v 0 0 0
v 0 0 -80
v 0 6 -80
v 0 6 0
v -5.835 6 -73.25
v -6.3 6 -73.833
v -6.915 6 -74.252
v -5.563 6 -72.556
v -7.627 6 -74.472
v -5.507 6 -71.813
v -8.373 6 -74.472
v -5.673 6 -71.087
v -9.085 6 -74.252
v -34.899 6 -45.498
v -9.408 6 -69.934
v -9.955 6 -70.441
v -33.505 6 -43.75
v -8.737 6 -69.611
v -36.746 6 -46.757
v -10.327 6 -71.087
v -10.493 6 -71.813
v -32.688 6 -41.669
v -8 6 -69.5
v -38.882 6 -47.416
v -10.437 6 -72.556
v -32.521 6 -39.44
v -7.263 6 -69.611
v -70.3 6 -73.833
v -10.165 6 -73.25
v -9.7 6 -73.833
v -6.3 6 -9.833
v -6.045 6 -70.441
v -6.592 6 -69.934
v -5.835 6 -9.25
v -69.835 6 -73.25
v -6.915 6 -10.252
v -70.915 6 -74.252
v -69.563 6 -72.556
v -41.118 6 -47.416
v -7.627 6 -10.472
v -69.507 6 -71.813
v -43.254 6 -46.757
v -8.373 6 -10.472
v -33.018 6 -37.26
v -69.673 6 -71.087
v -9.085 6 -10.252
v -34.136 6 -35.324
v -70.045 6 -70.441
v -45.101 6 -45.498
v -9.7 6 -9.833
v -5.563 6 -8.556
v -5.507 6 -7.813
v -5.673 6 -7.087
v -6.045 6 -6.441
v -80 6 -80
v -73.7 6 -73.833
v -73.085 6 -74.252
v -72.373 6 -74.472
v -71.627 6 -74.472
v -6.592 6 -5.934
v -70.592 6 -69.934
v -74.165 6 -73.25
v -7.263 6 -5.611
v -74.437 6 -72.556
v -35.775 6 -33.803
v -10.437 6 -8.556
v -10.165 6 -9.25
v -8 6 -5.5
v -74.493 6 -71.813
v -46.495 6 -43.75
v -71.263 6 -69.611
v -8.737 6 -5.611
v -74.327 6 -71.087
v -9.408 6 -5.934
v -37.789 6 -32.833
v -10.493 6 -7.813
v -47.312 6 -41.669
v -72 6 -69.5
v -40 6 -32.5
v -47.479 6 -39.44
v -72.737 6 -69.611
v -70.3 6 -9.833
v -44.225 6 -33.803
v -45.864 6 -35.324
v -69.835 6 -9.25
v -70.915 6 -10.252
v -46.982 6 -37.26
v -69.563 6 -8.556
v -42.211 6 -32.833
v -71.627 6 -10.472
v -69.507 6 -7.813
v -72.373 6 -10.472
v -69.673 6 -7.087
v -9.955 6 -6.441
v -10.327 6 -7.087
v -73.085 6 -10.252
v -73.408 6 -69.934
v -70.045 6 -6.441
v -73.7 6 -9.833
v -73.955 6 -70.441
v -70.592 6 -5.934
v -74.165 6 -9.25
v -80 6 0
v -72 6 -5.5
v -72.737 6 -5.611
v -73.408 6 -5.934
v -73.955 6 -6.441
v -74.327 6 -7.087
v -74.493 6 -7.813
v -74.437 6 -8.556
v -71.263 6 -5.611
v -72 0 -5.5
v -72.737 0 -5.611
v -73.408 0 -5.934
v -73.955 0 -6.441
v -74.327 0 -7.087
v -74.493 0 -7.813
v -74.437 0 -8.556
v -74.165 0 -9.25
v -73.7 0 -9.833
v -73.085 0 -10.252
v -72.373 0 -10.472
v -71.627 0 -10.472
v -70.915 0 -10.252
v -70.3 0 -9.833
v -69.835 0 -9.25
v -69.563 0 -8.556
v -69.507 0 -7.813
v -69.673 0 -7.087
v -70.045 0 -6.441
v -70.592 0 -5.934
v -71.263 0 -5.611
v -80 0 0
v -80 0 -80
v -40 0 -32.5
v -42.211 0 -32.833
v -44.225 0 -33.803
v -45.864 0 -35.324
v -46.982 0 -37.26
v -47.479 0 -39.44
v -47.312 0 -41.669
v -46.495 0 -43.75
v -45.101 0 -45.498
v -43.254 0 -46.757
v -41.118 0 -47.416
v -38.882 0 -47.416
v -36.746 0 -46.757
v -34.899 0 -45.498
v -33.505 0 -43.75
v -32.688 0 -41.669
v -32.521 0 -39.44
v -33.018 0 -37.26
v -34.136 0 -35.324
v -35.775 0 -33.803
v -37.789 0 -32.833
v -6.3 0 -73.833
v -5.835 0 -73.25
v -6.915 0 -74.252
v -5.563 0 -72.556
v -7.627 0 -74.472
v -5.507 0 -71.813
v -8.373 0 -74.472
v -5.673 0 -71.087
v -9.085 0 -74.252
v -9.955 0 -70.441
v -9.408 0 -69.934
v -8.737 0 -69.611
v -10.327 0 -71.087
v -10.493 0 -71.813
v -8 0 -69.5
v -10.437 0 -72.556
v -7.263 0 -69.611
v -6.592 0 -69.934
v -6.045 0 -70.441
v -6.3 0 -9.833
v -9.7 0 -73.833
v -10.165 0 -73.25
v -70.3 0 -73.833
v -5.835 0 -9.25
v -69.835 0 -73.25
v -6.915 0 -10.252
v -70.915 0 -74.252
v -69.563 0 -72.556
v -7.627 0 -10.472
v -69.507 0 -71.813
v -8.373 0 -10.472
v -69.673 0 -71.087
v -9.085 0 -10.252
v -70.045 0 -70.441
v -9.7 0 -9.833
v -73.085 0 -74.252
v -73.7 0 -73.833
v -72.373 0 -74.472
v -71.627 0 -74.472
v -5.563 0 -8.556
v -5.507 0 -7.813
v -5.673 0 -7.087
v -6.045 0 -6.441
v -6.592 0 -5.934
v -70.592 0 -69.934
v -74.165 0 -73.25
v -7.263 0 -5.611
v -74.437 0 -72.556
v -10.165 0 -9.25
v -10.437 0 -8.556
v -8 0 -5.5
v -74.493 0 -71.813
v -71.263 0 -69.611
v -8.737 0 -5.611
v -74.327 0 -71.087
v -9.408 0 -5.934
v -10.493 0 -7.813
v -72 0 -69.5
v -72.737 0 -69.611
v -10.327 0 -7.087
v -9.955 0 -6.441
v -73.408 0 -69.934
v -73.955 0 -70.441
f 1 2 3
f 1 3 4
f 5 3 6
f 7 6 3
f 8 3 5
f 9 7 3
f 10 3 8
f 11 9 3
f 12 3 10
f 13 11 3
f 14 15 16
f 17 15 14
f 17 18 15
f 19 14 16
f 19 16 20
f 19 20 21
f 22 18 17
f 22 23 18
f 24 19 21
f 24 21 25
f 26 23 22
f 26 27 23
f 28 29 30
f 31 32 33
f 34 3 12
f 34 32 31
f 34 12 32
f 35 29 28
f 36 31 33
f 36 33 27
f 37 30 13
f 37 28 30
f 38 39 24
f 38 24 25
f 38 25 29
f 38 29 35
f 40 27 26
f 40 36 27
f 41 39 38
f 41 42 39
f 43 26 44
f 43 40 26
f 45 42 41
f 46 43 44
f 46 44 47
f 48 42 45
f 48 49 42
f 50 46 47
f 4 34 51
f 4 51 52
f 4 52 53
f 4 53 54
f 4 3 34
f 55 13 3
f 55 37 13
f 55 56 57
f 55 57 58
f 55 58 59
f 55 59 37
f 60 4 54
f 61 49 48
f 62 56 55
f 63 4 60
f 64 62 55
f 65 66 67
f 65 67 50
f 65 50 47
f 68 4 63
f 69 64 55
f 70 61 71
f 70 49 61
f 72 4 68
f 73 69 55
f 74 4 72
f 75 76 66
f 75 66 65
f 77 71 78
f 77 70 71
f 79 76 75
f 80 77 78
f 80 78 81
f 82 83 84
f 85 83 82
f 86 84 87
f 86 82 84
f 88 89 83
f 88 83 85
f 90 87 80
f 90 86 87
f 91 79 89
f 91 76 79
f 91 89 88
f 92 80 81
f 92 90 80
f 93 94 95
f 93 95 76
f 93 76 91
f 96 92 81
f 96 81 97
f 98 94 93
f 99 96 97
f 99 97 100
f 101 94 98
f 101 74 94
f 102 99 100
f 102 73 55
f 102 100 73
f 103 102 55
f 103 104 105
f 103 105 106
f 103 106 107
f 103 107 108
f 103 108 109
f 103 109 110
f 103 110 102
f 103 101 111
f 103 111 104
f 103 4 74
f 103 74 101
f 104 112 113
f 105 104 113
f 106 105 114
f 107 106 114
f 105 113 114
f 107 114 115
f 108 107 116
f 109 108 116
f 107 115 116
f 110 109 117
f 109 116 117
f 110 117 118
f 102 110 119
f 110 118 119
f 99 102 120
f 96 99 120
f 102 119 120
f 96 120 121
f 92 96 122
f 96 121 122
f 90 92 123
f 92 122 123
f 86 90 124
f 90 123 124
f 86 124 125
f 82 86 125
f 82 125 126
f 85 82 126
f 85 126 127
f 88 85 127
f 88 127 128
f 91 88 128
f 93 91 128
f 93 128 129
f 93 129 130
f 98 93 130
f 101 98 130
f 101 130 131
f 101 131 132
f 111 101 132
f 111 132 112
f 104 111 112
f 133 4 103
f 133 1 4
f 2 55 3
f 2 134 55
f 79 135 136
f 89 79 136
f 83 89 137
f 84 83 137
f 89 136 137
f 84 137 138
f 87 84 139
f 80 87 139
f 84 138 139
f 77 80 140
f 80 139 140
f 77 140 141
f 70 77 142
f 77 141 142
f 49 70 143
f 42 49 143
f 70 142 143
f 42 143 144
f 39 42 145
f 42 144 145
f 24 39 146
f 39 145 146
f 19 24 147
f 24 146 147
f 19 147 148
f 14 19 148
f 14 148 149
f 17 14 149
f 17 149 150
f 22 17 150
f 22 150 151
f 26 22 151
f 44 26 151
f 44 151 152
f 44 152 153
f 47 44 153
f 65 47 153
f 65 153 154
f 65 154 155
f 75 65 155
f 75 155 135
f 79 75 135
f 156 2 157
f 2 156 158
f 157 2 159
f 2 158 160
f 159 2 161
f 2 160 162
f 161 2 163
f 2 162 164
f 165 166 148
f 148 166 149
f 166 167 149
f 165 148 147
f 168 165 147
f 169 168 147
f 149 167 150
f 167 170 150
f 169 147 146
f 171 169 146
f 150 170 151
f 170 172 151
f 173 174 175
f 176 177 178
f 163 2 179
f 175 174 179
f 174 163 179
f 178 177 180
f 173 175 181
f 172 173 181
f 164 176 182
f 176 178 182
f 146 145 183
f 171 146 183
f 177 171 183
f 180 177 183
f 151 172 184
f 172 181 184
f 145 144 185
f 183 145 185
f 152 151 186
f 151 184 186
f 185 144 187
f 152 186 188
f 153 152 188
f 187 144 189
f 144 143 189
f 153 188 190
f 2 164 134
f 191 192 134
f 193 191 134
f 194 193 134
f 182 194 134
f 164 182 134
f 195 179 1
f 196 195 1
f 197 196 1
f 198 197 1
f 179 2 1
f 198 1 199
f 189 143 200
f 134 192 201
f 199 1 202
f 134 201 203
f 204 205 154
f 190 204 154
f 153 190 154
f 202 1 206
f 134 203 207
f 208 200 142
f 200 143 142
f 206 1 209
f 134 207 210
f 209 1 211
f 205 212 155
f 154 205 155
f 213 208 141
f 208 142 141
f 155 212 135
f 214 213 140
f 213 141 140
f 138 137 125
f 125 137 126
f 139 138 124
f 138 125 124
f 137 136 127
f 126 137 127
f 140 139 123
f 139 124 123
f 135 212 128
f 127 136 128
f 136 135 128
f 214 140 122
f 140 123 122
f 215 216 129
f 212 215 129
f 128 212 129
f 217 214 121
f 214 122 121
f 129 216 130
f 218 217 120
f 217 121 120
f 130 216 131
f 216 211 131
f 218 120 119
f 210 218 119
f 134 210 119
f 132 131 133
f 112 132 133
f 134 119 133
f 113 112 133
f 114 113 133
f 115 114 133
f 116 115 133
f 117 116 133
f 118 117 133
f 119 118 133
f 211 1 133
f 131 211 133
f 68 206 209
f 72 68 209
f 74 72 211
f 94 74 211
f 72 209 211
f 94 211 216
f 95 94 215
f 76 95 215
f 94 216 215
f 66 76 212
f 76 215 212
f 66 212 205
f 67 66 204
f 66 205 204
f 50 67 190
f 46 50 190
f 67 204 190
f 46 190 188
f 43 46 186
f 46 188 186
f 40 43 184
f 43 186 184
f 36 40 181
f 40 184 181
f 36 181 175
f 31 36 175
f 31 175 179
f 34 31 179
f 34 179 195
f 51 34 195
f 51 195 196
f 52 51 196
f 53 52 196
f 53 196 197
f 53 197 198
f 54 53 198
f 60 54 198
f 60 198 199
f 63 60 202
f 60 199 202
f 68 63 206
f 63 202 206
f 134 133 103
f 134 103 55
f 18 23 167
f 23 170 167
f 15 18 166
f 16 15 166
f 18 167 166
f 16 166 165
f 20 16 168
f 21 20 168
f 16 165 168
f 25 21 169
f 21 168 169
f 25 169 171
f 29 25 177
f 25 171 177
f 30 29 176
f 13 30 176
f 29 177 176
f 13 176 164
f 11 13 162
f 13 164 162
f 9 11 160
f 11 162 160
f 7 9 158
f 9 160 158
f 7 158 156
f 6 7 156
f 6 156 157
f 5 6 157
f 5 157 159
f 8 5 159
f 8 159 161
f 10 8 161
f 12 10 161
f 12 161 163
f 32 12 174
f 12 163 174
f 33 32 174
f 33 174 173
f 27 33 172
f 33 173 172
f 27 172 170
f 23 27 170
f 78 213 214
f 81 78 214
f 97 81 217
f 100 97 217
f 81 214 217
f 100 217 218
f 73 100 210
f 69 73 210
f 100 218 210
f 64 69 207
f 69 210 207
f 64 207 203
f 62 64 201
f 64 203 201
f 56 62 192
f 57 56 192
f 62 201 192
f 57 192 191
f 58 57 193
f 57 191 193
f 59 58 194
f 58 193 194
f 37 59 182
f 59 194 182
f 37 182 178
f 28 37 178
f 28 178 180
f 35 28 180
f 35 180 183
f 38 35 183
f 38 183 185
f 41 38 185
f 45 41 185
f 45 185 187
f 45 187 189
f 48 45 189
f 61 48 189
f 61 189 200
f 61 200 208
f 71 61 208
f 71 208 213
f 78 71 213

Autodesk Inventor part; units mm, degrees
ref_plane "YZ Plane" through (0, 0, 0) normal (1, 0, 0) x (0, 1, 0)
ref_plane "XZ Plane" through (0, 0, 0) normal (0, 1, 0) x (-1, 0, 0)
ref_plane "XY Plane" through (0, 0, 0) normal (0, 0, 1) x (1, 0, 0)
sketch "Esboço1" plane through (0, 0, 0) normal (0, 1, 0) x (-1, 0, 0)
  line L0 (0, 0) -> (80, 0)
  line L1 (80, 0) -> (80, -80)
  line L2 (80, -80) -> (0, -80)
  line L3 (0, -80) -> (0, 0)
  dimension "d0" = 80
  dimension "d1" = 80
extrude "Extrusão1" add sketch "Esboço1" along normal blind 6
sketch "Esboço2" plane through (0, 6, 0) normal (0, 1, 0) x (1, 0, 0)
  line L0 (0, 80) -> (-80, 80) projected
  line L1 (-80, 80) -> (-80, 0) projected
  line L2 (-80, 0) -> (0, 0) projected
  line L3 (0, 0) -> (0, 80) projected
  point P0 (-8, 8)
  point P1 (-72, 8)
  point P2 (-72, 72)
  point P3 (-8, 72)
  dimension "d4" = 8
  dimension "d5" = 8
  dimension "d6" = 8
  dimension "d7" = 8
  dimension "d8" = 8
  dimension "d9" = 8
  dimension "d10" = 8
  dimension "d11" = 8
hole "Furo1" at (-8, 6, -8) at (-72, 6, -8) at (-72, 6, -72) at (-8, 6, -72) direction (0, -1, 0) diameter 5 depth 6
sketch "Esboço3" plane through (0, 6, 0) normal (0, 1, 0) x (1, 0, 0)
  line L0 (-80, 0) -> (0, 0) projected
  line L1 (-80, 80) -> (-80, 0) projected
  line L2 (0, 80) -> (-80, 80) projected
  line L3 (0, 0) -> (0, 80) projected
  point P0 (-40, 40)
  dimension "d19" = 80
  dimension "d20" = 40
  dimension "d21" = 40
hole "Furo2" at (-40, 6, -40) direction (0, -1, 0) diameter 15 depth 6
equation "\"d5\" = d4"
equation "\"d6\" = d5"
equation "\"d7\" = d5"
equation "\"d8\" = d7"
equation "\"d9\" = d6"
equation "\"d10\" = d9"
equation "\"d11\" = d4"
equation "\"d17\" = Espessura"
equation "\"d20\" = 0.5 * d19"
equation "\"d21\" = 0.5 * d19"
equation "\"Raio_vergadura\" = Espessura"
equation "\"Largura_alívio_de_vergadura\" = Espessura"
equation "\"Profundidade_alívio_de_vergadura\" = 0.5 * Espessura"
equation "\"Tamanho_alívio_de_dobra\" = 4 * Espessura"
equation "\"Remanescente_mínimo\" = 2 * Espessura"
equation "\"Raiodetransição\" = Raio_vergadura"
equation "\"Tamanho_de_raio_de_Jacobi\" = Raio_vergadura"
equation "\"TamanhoFolga\" = Espessura"
equation "\"Espessura\" = 0.5"
properties part number "Suporte inferior do eixo" material "Aluminum 6061"
